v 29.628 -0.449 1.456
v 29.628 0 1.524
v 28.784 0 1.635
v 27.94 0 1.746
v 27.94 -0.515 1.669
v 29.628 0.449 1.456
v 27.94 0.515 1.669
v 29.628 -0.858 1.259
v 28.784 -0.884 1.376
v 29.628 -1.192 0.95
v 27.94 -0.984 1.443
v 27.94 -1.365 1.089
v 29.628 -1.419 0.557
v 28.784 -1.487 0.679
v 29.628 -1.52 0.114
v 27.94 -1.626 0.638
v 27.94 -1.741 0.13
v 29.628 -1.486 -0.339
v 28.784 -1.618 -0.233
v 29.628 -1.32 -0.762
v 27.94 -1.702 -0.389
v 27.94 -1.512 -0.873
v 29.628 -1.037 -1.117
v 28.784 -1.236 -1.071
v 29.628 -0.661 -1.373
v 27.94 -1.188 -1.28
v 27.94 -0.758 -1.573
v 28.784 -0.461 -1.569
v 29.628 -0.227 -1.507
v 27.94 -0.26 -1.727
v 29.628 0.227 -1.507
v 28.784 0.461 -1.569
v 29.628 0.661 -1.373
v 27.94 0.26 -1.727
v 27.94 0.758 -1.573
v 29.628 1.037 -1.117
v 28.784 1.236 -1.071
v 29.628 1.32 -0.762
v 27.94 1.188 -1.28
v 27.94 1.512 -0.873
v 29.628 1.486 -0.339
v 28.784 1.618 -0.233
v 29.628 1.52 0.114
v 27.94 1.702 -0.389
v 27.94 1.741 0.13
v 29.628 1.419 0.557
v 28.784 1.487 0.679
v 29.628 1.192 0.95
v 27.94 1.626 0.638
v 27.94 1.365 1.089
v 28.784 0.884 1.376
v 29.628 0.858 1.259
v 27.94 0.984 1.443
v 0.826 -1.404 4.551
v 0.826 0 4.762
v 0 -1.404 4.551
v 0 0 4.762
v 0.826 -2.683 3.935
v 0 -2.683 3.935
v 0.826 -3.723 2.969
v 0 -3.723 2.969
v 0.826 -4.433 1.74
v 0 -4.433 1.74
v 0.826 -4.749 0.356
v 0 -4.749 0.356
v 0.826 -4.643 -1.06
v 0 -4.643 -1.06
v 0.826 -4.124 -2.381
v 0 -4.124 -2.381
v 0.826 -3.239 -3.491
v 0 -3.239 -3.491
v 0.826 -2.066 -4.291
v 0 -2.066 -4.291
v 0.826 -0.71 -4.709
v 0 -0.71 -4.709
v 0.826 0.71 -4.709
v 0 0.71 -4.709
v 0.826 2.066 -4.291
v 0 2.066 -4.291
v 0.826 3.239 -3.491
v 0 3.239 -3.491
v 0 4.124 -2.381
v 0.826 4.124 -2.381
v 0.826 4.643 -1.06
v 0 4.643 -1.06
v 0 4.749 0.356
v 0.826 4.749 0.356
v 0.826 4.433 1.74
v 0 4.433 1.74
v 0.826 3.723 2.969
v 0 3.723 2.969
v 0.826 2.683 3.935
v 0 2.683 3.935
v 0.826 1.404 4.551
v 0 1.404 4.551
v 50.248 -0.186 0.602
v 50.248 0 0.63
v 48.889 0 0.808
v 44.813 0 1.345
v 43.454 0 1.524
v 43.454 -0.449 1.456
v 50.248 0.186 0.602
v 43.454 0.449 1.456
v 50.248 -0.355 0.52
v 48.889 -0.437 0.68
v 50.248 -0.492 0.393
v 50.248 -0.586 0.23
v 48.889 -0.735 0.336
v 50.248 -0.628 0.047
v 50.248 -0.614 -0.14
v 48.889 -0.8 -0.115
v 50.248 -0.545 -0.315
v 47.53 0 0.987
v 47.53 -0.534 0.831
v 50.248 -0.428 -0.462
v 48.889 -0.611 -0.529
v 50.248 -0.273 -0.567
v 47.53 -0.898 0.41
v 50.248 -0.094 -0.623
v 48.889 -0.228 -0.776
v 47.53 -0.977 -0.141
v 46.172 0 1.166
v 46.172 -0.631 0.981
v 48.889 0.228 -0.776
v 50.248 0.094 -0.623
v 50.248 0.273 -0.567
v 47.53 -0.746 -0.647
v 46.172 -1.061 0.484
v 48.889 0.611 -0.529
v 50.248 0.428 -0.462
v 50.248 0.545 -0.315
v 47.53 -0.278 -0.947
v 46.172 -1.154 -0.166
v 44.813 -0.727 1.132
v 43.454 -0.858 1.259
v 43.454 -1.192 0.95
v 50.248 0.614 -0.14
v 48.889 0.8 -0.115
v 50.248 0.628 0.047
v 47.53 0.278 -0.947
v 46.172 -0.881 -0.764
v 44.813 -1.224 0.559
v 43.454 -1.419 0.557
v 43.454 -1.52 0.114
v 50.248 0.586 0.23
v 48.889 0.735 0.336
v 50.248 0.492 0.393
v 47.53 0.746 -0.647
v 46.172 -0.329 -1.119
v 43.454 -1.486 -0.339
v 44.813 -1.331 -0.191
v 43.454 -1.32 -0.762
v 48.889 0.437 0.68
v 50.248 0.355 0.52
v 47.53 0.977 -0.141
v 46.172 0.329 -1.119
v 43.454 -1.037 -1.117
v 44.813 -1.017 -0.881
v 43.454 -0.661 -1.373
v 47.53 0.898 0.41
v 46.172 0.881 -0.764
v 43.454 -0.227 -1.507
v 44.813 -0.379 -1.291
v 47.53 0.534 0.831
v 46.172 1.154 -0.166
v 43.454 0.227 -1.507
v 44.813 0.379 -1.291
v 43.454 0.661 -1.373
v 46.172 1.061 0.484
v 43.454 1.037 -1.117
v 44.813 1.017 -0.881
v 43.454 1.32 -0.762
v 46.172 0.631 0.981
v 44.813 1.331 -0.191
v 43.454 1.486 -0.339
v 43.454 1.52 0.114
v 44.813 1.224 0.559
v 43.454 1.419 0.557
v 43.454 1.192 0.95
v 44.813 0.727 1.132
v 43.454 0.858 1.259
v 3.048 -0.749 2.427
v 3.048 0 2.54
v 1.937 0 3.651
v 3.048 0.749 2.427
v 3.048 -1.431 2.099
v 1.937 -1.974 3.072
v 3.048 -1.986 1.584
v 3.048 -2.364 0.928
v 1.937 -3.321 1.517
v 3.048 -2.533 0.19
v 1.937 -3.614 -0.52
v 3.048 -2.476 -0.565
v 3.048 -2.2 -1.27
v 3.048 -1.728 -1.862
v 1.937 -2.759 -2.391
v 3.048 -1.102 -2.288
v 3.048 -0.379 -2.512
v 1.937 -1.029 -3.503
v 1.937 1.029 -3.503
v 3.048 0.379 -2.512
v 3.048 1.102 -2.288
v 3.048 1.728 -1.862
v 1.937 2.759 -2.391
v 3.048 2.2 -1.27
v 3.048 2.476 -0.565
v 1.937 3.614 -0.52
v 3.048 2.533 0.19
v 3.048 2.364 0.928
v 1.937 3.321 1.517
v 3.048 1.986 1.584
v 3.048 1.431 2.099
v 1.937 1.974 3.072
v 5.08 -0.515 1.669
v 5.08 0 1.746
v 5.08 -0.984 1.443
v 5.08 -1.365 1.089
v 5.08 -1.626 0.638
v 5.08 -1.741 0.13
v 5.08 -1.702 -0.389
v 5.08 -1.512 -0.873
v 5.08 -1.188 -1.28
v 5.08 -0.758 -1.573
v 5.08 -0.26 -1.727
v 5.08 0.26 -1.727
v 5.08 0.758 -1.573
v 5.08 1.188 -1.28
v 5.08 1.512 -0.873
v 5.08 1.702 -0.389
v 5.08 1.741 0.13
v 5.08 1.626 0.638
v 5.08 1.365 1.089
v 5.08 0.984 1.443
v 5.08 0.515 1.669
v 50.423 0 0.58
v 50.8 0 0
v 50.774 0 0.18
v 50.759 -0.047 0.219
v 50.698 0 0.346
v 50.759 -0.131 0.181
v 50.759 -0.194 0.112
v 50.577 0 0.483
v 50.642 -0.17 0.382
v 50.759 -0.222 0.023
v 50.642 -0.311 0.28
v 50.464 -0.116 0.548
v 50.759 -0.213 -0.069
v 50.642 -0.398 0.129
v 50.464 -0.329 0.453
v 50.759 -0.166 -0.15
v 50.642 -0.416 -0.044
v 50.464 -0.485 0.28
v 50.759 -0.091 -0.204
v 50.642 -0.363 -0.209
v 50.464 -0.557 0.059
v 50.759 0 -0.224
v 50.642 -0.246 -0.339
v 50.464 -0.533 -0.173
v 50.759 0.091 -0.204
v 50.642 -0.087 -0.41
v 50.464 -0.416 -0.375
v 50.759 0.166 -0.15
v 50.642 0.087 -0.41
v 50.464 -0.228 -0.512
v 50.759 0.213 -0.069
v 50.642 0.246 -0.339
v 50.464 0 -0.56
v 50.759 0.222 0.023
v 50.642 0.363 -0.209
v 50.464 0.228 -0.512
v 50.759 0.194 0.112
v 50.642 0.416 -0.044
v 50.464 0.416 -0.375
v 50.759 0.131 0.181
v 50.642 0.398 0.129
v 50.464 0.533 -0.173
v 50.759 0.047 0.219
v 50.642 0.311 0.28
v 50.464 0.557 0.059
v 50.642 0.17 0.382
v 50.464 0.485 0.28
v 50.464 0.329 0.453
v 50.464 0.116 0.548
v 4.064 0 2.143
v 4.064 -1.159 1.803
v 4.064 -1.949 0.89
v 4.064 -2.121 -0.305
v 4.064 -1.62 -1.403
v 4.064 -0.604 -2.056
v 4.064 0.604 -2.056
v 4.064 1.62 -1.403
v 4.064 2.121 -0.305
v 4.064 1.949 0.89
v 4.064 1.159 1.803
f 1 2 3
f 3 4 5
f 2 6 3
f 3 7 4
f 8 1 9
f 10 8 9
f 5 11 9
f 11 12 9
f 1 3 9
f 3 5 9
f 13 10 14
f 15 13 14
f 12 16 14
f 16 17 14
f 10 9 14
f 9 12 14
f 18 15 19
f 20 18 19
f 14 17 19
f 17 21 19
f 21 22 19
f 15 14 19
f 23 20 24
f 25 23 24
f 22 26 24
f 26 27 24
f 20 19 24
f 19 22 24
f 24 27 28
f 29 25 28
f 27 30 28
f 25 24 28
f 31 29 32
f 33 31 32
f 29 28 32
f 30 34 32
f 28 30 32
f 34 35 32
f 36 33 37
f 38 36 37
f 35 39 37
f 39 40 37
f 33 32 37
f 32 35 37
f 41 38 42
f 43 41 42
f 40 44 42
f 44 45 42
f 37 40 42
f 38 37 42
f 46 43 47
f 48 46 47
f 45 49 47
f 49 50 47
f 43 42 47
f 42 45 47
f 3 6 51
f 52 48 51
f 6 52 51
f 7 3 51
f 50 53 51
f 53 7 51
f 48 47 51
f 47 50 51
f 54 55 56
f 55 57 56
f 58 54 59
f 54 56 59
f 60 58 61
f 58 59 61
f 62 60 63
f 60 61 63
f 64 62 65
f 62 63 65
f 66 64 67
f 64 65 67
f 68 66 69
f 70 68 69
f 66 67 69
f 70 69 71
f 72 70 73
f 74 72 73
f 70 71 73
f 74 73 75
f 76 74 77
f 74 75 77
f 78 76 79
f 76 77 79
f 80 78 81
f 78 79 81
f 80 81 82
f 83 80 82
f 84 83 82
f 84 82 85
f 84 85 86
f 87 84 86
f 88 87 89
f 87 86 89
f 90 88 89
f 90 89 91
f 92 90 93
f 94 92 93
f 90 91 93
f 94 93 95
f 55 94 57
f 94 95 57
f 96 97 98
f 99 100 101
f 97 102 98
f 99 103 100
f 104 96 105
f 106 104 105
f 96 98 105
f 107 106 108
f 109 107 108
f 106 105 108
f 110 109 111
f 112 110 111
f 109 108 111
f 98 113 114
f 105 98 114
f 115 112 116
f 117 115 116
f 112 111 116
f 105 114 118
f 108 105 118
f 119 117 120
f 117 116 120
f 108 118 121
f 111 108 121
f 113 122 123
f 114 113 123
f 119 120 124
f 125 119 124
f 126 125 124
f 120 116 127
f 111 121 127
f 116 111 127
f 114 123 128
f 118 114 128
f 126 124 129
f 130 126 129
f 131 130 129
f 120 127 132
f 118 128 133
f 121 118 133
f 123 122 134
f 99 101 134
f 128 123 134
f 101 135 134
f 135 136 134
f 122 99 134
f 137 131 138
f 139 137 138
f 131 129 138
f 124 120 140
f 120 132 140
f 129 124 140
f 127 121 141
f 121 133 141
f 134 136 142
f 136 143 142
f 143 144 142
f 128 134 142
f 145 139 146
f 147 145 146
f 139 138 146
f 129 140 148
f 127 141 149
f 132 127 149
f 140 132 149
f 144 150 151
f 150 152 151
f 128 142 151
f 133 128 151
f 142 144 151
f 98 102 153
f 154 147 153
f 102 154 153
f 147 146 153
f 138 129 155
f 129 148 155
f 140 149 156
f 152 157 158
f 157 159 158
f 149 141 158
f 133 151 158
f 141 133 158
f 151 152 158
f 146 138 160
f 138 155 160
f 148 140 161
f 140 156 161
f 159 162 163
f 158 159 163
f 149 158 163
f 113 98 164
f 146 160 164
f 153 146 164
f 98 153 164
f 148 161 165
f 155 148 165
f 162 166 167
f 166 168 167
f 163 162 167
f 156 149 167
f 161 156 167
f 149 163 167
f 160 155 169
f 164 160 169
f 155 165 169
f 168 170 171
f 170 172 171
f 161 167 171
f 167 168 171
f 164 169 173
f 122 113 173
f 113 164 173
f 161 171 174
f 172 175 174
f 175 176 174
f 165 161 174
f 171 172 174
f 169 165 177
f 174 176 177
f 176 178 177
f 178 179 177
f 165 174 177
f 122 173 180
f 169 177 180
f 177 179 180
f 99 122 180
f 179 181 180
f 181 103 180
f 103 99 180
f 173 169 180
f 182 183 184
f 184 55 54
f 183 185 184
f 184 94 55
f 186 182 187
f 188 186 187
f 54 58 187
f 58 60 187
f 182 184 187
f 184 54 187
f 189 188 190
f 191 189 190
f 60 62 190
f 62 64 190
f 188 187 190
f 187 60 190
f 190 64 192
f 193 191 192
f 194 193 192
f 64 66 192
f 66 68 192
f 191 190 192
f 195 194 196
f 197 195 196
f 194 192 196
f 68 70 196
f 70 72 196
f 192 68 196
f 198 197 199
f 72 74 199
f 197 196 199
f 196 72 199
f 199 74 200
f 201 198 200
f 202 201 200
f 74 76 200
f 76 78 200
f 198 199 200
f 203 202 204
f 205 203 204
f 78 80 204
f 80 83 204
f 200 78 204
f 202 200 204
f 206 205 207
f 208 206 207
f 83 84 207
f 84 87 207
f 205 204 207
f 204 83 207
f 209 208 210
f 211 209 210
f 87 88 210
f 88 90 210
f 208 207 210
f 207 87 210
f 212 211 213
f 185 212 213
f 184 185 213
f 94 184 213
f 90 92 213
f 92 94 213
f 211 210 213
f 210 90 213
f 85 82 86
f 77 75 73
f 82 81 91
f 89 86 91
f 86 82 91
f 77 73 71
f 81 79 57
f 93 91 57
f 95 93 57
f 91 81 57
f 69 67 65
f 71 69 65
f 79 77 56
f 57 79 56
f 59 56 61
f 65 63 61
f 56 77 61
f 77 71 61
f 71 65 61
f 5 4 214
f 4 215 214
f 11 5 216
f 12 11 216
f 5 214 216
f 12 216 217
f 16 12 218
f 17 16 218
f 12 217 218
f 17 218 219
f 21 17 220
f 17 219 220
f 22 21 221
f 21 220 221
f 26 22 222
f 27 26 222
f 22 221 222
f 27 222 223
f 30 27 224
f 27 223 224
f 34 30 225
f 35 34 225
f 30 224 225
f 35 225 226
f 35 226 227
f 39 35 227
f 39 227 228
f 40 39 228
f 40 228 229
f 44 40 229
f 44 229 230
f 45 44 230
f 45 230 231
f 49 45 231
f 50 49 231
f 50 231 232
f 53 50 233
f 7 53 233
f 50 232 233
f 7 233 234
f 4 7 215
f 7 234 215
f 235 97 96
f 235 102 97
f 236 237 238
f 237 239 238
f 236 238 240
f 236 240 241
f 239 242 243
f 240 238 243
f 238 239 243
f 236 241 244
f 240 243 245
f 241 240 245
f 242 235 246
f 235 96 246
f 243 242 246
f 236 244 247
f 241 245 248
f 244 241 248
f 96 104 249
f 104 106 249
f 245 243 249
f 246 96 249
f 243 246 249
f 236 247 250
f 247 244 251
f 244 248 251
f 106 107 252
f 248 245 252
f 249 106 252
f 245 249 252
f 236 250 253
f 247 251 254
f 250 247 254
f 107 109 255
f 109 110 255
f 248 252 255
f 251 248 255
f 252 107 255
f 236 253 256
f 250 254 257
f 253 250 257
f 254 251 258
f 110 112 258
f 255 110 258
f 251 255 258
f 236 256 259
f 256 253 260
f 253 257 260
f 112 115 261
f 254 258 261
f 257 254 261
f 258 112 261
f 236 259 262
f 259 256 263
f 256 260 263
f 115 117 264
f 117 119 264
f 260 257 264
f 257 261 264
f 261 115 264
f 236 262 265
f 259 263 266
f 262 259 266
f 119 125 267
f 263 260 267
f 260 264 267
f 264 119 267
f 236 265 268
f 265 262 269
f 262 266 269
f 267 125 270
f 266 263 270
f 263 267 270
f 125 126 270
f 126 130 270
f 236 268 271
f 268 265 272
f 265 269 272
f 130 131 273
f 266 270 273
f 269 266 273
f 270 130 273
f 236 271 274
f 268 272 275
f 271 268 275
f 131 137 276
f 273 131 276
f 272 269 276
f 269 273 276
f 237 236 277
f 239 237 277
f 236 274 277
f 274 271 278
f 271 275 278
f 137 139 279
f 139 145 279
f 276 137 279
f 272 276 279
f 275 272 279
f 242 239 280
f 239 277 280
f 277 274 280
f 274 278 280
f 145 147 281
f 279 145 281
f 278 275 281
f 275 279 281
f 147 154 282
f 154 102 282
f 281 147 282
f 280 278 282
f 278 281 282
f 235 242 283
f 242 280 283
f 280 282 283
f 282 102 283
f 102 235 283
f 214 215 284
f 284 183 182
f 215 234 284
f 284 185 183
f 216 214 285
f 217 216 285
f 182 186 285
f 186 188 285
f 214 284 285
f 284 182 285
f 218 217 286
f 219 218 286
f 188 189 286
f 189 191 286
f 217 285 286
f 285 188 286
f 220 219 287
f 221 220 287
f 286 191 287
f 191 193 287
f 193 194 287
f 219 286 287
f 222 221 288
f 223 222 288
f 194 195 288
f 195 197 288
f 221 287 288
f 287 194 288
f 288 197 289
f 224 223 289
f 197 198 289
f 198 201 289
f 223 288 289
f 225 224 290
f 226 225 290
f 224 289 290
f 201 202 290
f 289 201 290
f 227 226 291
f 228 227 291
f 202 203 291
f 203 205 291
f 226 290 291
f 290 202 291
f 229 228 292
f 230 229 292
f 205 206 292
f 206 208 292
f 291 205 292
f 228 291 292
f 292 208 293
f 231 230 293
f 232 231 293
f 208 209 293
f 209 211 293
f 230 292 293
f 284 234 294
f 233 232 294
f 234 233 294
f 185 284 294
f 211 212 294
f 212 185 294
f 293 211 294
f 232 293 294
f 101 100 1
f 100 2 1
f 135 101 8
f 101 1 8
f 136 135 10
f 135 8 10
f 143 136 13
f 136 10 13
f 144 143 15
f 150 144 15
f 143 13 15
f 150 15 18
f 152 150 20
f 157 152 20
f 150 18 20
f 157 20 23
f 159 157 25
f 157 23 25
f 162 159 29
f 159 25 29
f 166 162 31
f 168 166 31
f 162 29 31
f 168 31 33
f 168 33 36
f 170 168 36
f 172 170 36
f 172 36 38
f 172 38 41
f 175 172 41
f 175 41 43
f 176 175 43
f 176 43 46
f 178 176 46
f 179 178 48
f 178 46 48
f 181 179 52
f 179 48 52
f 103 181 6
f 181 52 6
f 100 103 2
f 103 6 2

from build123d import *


with BuildPart() as part:
    # Sketch1 → Revolve1 (revolve)
    with BuildSketch(Plane.XY, mode=Mode.PRIVATE) as revolve1_sk:
        with BuildLine():
            Line((0, -4.7625), (0, 0))
            Line((0, 0), (50.8, 0))
            ThreePointArc((50.8, 0), (50.642418278, -0.418684593), (50.247884132, -0.629567487))
            Line((50.247884132, -0.629567487), (43.453994693, -1.524))
            Line((43.453994693, -1.524), (29.628156352, -1.524))
            Line((29.628156352, -1.524), (27.94, -1.74625))
            Line((27.94, -1.74625), (5.08, -1.74625))
            Line((5.08, -1.74625), (3.048, -2.54))
            Line((3.048, -2.54), (0.8255, -4.7625))
            Line((0.8255, -4.7625), (0, -4.7625))
        make_face()
    revolve(revolve1_sk.sketch.rotate(Axis((0, 0, 0), (1, 0, 0)), 270), axis=Axis((0, 0, 0), (1, 0, 0)))


solid = part.part
